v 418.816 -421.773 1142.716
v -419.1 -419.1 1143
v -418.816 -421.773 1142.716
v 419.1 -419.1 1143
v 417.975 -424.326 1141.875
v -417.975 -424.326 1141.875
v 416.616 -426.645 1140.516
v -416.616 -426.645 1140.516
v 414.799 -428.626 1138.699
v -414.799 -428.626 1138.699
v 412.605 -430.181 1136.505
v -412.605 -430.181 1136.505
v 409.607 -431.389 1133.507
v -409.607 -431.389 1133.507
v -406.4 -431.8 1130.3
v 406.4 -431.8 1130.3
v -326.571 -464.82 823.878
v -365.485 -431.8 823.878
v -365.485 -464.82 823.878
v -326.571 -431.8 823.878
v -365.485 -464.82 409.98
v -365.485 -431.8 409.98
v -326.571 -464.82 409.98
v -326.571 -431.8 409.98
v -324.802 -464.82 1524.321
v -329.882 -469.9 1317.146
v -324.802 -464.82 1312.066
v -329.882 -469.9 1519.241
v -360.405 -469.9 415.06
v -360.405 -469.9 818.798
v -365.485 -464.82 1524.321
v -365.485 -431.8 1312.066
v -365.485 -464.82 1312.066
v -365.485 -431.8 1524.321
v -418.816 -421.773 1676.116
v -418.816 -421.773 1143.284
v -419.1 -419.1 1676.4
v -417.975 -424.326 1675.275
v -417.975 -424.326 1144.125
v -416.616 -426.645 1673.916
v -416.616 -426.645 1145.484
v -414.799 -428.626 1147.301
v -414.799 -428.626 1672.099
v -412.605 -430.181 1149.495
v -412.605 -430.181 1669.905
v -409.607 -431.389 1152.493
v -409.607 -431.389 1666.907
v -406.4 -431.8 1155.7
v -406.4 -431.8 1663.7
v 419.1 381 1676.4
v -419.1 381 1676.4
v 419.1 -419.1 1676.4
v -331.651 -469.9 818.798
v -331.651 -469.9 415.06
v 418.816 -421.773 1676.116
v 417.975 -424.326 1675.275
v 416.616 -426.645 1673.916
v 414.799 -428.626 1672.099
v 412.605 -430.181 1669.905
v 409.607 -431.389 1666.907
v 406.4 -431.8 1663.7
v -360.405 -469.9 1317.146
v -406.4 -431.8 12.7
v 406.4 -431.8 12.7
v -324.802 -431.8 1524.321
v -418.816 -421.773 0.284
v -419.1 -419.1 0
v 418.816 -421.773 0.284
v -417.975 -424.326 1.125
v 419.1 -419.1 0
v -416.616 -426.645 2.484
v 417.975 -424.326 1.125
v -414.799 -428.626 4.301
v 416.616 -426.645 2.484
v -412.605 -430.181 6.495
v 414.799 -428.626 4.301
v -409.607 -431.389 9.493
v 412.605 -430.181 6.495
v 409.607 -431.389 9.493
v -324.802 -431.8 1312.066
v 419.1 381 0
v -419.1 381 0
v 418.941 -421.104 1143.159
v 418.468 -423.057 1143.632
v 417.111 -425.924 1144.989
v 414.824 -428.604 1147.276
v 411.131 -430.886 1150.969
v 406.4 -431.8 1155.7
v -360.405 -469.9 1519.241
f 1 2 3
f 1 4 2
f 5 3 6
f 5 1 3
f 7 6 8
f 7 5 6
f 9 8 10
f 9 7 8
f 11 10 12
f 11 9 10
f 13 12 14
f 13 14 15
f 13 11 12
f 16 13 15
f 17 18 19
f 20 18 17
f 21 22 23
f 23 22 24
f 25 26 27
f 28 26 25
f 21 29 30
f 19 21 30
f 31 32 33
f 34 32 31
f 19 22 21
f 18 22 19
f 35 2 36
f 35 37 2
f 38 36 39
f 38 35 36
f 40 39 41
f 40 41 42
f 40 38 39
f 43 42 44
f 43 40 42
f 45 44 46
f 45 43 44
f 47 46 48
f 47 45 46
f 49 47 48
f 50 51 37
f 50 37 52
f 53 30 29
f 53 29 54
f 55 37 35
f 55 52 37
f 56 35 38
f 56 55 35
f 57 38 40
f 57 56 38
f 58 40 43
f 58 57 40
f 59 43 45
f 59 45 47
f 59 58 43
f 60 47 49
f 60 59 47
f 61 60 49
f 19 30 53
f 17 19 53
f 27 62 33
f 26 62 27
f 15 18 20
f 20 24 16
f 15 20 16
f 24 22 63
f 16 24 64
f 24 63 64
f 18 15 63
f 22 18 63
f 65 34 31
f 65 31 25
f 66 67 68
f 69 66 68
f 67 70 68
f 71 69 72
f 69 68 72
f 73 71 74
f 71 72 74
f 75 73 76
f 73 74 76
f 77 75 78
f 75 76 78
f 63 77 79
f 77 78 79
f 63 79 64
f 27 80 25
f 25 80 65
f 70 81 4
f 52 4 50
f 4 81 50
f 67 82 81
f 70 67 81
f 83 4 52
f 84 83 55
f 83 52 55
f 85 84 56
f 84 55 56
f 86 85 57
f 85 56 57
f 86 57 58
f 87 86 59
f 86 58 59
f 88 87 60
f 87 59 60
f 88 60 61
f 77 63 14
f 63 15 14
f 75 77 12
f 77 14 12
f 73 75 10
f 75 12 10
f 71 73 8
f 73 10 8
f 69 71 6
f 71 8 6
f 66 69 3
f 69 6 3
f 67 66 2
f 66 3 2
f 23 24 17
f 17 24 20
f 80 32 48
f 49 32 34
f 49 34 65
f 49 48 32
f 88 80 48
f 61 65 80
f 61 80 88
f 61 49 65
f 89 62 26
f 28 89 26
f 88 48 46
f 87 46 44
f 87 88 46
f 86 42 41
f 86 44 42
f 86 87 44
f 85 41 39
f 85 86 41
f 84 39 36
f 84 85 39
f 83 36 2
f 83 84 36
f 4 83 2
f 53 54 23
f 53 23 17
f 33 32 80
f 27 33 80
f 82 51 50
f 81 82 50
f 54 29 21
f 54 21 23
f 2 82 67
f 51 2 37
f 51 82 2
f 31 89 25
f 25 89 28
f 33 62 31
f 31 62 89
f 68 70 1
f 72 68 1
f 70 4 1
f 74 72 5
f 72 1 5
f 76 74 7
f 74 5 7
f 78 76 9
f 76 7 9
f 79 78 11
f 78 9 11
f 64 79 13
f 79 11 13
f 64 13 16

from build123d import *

# Parameters (mm, degrees)
F0_W      = 838.2
F0_H      = 762
F1_DEPTH  = 1676.4
F2_W      = 838.2
F2_H      = 533.4
F2_W_2    = 38.1
F2_H_2    = 203.2
F3_DEPTH  = 50.8
F4_R      = 12.7
F5_DEPTH  = 50.8
F6_R      = 12.69999
F7_W      = 40.6822860241
F7_H      = 212.2554779053
F8_DEPTH  = 38.1
F9_SIZE   = 5.08
F10_W     = 38.9135181904
F10_H     = 413.8980805874
F11_DEPTH = 38.1
F12_SIZE  = 5.08


# Not quite as in the source:
# - a fillet or chamfer is up to 0.001 mm smaller than in the source, because OpenCascade refuses the exact size


with BuildPart() as f1:
    # F0 (on Top) → F1 (new body)
    with BuildSketch(Plane.XY):
        Rectangle(F0_W, F0_H)
    extrude(amount=F1_DEPTH)

    # F2 (on face) → F3 (join)
    with BuildSketch(Plane.XZ.offset(381)):
        with Locations((0, 1409.7)):
            Rectangle(F2_W, F2_H)
        with Locations((-346.277383852, 1415.0833574295)):
            Rectangle(F2_W_2, F2_H_2, mode=Mode.SUBTRACT)
        with Locations((-346.277383852, 1415.0833574295)):
            Rectangle(F2_W_2, F2_H_2)
    extrude(amount=F3_DEPTH)

    # F4
    f4_edges = [f1.edges().sort_by_distance(p)[0] for p in [
        (0, -431.8, 1676.4),
        (-419.1, -431.8, 1409.7),
        (0, -431.8, 1143),
        (419.1, -431.8, 1409.7),
    ]]
    fillet(f4_edges, radius=F4_R)

    # F5 (add): a face of the model
    f5_faces = [f1.faces().sort_by_distance(p)[0] for p in [
        (0, -381, 571.5),
    ]]
    extrude(f5_faces, amount=F5_DEPTH)

    # F6 (radius 12.7 in the source; OpenCascade refuses exactly that, so slightly less here)
    f6_edges = [f1.edges().sort_by_distance(p)[0] for p in [
        (0, -431.8, 0),
        (419.1, -431.8, 571.5),
        (0, -431.8, 1143),
        (-419.1, -431.8, 571.5),
    ]]
    fillet(f6_edges, radius=F6_R)

    # F7 (on face) → F8 (join)
    with BuildSketch(Plane.XZ.offset(431.8)):
        with Locations((-345.143482089, 1418.1935787201)):
            Rectangle(F7_W, F7_H)
    extrude(amount=F8_DEPTH)

    # F9
    f9_edges = [f1.edges().sort_by_distance(p)[0] for p in [
        (-345.143482, -469.9, 1524.321318),
        (-365.484625, -469.9, 1418.193579),
        (-345.143482, -469.9, 1312.06584),
        (-324.802339, -469.9, 1418.193579),
    ]]
    chamfer(f9_edges, length=F9_SIZE)

    # F10 (on face) → F11 (join)
    with BuildSketch(Plane.XZ.offset(431.8)):
        with Locations((-346.0278660059, 616.92930758)):
            Rectangle(F10_W, F10_H)
    extrude(amount=F11_DEPTH)

    # F12
    f12_edges = [f1.edges().sort_by_distance(p)[0] for p in [
        (-346.027866, -469.9, 823.878348),
        (-365.484625, -469.9, 616.929308),
        (-346.027866, -469.9, 409.980267),
        (-326.571107, -469.9, 616.929308),
    ]]
    chamfer(f12_edges, length=F12_SIZE)


solid = f1.part
